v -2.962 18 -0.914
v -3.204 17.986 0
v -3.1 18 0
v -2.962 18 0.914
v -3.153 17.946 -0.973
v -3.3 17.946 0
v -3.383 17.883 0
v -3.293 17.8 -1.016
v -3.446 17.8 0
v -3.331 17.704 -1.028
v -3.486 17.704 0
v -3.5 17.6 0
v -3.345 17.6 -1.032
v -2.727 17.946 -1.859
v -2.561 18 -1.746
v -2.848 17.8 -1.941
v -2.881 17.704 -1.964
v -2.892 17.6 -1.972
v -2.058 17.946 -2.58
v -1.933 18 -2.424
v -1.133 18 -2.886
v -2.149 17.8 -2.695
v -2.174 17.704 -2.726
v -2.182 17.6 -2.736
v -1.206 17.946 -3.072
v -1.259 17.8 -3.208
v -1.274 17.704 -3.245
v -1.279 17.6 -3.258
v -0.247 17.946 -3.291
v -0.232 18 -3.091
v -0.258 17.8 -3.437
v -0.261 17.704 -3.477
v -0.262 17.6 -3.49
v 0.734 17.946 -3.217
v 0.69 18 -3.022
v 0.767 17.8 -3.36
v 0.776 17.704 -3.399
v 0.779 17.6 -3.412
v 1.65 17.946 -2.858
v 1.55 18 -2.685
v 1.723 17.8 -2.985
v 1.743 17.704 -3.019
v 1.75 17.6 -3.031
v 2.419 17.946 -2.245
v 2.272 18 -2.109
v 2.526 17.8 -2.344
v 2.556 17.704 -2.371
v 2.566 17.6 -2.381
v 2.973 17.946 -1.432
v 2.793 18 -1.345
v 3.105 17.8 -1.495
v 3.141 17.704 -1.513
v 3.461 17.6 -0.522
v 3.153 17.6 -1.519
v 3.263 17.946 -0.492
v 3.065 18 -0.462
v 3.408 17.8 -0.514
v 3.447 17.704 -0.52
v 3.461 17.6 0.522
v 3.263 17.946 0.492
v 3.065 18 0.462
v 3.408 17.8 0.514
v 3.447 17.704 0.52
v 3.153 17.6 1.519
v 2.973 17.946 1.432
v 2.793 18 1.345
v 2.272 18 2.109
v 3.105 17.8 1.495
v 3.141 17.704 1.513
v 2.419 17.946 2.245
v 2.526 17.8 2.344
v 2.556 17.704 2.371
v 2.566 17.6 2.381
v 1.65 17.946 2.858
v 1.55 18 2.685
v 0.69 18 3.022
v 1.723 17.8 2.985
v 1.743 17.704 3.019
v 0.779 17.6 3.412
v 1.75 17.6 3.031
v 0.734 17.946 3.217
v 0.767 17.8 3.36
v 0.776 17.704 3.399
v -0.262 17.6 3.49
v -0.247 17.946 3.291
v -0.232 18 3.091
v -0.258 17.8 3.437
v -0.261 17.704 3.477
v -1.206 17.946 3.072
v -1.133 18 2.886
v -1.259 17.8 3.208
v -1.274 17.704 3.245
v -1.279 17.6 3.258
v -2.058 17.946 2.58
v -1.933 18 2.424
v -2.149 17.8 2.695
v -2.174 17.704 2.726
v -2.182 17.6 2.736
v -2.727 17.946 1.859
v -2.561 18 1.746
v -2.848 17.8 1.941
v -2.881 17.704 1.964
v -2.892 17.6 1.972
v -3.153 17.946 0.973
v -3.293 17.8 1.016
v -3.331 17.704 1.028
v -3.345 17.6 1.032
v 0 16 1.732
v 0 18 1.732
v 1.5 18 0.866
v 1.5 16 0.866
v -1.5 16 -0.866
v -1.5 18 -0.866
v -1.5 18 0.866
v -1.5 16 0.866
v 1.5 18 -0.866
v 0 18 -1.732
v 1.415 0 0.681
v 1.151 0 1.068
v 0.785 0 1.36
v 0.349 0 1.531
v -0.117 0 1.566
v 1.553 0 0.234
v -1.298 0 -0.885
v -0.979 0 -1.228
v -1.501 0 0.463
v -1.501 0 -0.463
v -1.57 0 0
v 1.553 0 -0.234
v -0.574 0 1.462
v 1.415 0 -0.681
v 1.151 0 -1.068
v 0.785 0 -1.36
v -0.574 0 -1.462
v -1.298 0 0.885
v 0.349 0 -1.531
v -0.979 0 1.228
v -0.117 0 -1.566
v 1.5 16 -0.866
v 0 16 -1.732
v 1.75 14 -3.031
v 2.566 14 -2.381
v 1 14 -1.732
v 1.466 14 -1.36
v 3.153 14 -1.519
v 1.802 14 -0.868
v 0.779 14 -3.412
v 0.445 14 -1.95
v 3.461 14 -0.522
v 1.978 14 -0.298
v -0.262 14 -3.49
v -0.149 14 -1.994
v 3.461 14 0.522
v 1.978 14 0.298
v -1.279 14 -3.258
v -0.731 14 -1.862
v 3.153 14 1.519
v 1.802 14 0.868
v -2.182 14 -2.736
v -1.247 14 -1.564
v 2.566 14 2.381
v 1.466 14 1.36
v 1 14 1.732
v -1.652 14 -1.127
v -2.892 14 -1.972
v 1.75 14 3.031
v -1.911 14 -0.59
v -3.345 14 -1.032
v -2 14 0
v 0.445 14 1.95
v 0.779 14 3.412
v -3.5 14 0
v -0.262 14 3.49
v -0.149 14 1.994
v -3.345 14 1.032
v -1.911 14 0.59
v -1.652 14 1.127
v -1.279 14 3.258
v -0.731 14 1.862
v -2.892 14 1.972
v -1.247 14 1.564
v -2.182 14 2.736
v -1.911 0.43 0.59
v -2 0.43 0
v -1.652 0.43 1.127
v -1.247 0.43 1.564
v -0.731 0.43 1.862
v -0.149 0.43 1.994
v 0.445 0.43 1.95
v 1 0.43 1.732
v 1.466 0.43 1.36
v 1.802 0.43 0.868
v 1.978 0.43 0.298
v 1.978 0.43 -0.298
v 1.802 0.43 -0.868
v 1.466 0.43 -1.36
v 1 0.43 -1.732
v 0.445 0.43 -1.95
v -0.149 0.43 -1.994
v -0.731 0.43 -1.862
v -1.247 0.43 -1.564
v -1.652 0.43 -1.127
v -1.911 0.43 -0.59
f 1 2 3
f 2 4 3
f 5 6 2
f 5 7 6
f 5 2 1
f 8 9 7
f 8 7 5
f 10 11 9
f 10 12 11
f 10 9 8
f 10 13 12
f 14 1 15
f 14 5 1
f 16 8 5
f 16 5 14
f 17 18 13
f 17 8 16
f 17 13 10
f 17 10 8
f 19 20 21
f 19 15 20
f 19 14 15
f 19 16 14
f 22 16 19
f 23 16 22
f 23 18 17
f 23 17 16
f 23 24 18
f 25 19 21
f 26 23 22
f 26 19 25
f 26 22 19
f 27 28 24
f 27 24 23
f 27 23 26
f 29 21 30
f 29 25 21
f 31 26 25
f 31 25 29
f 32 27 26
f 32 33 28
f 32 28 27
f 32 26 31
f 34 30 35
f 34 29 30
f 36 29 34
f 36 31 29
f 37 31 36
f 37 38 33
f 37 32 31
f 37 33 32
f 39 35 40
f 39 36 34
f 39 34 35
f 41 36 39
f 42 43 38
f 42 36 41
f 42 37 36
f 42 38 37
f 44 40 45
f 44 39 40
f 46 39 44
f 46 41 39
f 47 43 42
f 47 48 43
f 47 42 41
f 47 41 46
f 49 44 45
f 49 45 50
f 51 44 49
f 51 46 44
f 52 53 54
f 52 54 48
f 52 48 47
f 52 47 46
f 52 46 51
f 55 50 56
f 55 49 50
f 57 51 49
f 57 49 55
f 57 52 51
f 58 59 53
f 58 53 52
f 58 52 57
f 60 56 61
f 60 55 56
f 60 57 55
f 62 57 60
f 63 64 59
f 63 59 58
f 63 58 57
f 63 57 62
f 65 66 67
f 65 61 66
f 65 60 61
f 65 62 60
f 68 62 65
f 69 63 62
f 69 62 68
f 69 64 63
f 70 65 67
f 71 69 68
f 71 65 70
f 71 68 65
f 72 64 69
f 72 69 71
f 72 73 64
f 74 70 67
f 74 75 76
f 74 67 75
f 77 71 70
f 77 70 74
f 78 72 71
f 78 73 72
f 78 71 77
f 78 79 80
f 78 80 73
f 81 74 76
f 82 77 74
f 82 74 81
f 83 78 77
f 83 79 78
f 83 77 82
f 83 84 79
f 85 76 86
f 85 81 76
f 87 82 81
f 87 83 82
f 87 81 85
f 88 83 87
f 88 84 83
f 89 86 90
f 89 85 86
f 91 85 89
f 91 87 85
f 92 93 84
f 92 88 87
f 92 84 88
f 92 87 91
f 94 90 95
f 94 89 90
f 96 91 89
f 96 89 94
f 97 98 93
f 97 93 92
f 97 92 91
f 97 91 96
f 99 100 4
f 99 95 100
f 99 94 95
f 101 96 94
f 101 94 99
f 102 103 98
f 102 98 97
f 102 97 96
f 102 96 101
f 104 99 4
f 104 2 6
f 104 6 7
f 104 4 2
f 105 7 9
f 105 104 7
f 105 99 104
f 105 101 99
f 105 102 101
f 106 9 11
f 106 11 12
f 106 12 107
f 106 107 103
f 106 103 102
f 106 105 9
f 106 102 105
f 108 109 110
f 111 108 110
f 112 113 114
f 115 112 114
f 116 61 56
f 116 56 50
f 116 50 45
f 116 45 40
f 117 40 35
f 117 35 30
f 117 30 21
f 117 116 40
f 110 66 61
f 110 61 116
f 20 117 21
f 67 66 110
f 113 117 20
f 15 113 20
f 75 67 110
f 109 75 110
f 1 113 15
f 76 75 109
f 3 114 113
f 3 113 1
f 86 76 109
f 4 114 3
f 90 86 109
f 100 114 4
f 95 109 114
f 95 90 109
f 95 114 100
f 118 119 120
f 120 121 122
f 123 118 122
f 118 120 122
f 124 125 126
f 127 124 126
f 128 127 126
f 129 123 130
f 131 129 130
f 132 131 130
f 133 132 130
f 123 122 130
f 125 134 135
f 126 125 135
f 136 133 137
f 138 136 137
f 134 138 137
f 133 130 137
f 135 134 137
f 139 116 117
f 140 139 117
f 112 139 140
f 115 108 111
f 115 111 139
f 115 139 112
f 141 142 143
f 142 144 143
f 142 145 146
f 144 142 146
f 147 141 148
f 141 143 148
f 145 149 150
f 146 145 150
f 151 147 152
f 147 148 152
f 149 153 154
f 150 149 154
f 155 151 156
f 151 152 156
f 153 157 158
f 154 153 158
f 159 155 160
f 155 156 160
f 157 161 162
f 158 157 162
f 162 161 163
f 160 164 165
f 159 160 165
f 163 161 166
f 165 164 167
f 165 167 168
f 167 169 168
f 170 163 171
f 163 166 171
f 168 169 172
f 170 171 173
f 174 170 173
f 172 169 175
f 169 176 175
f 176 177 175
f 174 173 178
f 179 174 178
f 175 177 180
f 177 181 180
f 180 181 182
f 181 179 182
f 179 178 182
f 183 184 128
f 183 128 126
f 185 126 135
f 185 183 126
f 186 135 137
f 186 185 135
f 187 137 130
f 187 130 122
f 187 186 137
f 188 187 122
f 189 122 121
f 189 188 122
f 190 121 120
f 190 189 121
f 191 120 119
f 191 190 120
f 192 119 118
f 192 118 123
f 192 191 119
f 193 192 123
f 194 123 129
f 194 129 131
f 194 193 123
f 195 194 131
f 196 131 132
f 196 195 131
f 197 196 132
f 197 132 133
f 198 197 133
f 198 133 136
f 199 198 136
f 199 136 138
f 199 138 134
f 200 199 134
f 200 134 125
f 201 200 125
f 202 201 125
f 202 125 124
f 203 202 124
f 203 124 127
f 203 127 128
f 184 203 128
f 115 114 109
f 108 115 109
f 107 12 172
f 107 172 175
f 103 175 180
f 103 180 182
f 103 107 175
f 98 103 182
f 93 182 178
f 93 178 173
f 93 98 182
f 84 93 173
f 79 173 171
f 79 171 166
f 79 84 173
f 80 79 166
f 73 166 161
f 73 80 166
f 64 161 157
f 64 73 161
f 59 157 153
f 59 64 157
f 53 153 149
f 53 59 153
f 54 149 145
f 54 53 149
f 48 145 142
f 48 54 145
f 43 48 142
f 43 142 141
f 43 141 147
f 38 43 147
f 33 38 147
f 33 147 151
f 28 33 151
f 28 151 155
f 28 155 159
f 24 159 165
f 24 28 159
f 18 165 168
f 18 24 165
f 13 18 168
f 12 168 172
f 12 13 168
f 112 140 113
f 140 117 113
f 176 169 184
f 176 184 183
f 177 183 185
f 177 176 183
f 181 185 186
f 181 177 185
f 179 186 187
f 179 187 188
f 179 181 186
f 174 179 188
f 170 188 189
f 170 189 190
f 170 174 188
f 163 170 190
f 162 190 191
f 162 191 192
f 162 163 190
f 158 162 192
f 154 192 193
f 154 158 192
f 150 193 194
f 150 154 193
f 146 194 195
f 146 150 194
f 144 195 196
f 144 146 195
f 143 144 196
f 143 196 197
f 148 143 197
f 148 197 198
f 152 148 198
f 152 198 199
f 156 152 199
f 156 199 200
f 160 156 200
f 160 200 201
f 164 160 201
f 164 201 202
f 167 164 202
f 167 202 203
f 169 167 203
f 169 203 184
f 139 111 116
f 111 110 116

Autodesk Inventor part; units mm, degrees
sketch "Skizze_1" plane through (0, 0, 0) normal (0, 0, 1) x (1, 0, 0)
  line L0 (0, 18) -> (0, 0)
  line L1 (0, 0) -> (-1.5705, 0)
  line L2 (-1.5705, 0) -> (-2, 0.4295)
  line L3 (-2, 0.4295) -> (-2, 14)
  line L4 (-2, 14) -> (-3.5, 14)
  line L5 (-3.5, 14) -> (-3.5, 17.6)
  arc A0 (-3.1, 18) -> (-3.5, 17.6) centre (-3.1, 17.6) ccw
  line L6 (-3.1, 18) -> (0, 18)
  line L7 (0, 18) -> (0, 0)
revolve "Revolution1" add sketch "Skizze_1" angle 360 about axis through (0, 18, 0) along (0, 1, 0)
thread "Thread1" size "M4x0.7" class "6g" standard "ISO Metric profile" length 12.7132
sketch "Skizze_2" plane through (0, 18, 0) normal (0, 1, 0) x (-1, 0, 0)
  line L0 (-1.5, -0.866) -> (0, -1.7321)
  line L1 (0, -1.7321) -> (1.5, -0.866)
  line L2 (1.5, -0.866) -> (1.5, 0.866)
  line L3 (1.5, 0.866) -> (0, 1.7321)
  line L4 (0, 1.7321) -> (-1.5, 0.866)
  line L5 (-1.5, 0.866) -> (-1.5, -0.866)
extrude "Extrusion1" cut sketch "Skizze_2" against normal blind 2
ref_plane "anf_ge_1_XY" through (0, 14, 0) normal (0, 1, 0) x (1, 0, 0)
ref_plane "anf_ge_1_YZ" through (0, 14, 0) normal (1, 0, 0) x (0, 0, -1)
ref_plane "anf_ge_1_ZX" through (0, 14, 0) normal (0, 0, -1) x (0, 1, 0)
properties part number "62311400GA_2" material "Steel AISI 1045 225 ANLD"
